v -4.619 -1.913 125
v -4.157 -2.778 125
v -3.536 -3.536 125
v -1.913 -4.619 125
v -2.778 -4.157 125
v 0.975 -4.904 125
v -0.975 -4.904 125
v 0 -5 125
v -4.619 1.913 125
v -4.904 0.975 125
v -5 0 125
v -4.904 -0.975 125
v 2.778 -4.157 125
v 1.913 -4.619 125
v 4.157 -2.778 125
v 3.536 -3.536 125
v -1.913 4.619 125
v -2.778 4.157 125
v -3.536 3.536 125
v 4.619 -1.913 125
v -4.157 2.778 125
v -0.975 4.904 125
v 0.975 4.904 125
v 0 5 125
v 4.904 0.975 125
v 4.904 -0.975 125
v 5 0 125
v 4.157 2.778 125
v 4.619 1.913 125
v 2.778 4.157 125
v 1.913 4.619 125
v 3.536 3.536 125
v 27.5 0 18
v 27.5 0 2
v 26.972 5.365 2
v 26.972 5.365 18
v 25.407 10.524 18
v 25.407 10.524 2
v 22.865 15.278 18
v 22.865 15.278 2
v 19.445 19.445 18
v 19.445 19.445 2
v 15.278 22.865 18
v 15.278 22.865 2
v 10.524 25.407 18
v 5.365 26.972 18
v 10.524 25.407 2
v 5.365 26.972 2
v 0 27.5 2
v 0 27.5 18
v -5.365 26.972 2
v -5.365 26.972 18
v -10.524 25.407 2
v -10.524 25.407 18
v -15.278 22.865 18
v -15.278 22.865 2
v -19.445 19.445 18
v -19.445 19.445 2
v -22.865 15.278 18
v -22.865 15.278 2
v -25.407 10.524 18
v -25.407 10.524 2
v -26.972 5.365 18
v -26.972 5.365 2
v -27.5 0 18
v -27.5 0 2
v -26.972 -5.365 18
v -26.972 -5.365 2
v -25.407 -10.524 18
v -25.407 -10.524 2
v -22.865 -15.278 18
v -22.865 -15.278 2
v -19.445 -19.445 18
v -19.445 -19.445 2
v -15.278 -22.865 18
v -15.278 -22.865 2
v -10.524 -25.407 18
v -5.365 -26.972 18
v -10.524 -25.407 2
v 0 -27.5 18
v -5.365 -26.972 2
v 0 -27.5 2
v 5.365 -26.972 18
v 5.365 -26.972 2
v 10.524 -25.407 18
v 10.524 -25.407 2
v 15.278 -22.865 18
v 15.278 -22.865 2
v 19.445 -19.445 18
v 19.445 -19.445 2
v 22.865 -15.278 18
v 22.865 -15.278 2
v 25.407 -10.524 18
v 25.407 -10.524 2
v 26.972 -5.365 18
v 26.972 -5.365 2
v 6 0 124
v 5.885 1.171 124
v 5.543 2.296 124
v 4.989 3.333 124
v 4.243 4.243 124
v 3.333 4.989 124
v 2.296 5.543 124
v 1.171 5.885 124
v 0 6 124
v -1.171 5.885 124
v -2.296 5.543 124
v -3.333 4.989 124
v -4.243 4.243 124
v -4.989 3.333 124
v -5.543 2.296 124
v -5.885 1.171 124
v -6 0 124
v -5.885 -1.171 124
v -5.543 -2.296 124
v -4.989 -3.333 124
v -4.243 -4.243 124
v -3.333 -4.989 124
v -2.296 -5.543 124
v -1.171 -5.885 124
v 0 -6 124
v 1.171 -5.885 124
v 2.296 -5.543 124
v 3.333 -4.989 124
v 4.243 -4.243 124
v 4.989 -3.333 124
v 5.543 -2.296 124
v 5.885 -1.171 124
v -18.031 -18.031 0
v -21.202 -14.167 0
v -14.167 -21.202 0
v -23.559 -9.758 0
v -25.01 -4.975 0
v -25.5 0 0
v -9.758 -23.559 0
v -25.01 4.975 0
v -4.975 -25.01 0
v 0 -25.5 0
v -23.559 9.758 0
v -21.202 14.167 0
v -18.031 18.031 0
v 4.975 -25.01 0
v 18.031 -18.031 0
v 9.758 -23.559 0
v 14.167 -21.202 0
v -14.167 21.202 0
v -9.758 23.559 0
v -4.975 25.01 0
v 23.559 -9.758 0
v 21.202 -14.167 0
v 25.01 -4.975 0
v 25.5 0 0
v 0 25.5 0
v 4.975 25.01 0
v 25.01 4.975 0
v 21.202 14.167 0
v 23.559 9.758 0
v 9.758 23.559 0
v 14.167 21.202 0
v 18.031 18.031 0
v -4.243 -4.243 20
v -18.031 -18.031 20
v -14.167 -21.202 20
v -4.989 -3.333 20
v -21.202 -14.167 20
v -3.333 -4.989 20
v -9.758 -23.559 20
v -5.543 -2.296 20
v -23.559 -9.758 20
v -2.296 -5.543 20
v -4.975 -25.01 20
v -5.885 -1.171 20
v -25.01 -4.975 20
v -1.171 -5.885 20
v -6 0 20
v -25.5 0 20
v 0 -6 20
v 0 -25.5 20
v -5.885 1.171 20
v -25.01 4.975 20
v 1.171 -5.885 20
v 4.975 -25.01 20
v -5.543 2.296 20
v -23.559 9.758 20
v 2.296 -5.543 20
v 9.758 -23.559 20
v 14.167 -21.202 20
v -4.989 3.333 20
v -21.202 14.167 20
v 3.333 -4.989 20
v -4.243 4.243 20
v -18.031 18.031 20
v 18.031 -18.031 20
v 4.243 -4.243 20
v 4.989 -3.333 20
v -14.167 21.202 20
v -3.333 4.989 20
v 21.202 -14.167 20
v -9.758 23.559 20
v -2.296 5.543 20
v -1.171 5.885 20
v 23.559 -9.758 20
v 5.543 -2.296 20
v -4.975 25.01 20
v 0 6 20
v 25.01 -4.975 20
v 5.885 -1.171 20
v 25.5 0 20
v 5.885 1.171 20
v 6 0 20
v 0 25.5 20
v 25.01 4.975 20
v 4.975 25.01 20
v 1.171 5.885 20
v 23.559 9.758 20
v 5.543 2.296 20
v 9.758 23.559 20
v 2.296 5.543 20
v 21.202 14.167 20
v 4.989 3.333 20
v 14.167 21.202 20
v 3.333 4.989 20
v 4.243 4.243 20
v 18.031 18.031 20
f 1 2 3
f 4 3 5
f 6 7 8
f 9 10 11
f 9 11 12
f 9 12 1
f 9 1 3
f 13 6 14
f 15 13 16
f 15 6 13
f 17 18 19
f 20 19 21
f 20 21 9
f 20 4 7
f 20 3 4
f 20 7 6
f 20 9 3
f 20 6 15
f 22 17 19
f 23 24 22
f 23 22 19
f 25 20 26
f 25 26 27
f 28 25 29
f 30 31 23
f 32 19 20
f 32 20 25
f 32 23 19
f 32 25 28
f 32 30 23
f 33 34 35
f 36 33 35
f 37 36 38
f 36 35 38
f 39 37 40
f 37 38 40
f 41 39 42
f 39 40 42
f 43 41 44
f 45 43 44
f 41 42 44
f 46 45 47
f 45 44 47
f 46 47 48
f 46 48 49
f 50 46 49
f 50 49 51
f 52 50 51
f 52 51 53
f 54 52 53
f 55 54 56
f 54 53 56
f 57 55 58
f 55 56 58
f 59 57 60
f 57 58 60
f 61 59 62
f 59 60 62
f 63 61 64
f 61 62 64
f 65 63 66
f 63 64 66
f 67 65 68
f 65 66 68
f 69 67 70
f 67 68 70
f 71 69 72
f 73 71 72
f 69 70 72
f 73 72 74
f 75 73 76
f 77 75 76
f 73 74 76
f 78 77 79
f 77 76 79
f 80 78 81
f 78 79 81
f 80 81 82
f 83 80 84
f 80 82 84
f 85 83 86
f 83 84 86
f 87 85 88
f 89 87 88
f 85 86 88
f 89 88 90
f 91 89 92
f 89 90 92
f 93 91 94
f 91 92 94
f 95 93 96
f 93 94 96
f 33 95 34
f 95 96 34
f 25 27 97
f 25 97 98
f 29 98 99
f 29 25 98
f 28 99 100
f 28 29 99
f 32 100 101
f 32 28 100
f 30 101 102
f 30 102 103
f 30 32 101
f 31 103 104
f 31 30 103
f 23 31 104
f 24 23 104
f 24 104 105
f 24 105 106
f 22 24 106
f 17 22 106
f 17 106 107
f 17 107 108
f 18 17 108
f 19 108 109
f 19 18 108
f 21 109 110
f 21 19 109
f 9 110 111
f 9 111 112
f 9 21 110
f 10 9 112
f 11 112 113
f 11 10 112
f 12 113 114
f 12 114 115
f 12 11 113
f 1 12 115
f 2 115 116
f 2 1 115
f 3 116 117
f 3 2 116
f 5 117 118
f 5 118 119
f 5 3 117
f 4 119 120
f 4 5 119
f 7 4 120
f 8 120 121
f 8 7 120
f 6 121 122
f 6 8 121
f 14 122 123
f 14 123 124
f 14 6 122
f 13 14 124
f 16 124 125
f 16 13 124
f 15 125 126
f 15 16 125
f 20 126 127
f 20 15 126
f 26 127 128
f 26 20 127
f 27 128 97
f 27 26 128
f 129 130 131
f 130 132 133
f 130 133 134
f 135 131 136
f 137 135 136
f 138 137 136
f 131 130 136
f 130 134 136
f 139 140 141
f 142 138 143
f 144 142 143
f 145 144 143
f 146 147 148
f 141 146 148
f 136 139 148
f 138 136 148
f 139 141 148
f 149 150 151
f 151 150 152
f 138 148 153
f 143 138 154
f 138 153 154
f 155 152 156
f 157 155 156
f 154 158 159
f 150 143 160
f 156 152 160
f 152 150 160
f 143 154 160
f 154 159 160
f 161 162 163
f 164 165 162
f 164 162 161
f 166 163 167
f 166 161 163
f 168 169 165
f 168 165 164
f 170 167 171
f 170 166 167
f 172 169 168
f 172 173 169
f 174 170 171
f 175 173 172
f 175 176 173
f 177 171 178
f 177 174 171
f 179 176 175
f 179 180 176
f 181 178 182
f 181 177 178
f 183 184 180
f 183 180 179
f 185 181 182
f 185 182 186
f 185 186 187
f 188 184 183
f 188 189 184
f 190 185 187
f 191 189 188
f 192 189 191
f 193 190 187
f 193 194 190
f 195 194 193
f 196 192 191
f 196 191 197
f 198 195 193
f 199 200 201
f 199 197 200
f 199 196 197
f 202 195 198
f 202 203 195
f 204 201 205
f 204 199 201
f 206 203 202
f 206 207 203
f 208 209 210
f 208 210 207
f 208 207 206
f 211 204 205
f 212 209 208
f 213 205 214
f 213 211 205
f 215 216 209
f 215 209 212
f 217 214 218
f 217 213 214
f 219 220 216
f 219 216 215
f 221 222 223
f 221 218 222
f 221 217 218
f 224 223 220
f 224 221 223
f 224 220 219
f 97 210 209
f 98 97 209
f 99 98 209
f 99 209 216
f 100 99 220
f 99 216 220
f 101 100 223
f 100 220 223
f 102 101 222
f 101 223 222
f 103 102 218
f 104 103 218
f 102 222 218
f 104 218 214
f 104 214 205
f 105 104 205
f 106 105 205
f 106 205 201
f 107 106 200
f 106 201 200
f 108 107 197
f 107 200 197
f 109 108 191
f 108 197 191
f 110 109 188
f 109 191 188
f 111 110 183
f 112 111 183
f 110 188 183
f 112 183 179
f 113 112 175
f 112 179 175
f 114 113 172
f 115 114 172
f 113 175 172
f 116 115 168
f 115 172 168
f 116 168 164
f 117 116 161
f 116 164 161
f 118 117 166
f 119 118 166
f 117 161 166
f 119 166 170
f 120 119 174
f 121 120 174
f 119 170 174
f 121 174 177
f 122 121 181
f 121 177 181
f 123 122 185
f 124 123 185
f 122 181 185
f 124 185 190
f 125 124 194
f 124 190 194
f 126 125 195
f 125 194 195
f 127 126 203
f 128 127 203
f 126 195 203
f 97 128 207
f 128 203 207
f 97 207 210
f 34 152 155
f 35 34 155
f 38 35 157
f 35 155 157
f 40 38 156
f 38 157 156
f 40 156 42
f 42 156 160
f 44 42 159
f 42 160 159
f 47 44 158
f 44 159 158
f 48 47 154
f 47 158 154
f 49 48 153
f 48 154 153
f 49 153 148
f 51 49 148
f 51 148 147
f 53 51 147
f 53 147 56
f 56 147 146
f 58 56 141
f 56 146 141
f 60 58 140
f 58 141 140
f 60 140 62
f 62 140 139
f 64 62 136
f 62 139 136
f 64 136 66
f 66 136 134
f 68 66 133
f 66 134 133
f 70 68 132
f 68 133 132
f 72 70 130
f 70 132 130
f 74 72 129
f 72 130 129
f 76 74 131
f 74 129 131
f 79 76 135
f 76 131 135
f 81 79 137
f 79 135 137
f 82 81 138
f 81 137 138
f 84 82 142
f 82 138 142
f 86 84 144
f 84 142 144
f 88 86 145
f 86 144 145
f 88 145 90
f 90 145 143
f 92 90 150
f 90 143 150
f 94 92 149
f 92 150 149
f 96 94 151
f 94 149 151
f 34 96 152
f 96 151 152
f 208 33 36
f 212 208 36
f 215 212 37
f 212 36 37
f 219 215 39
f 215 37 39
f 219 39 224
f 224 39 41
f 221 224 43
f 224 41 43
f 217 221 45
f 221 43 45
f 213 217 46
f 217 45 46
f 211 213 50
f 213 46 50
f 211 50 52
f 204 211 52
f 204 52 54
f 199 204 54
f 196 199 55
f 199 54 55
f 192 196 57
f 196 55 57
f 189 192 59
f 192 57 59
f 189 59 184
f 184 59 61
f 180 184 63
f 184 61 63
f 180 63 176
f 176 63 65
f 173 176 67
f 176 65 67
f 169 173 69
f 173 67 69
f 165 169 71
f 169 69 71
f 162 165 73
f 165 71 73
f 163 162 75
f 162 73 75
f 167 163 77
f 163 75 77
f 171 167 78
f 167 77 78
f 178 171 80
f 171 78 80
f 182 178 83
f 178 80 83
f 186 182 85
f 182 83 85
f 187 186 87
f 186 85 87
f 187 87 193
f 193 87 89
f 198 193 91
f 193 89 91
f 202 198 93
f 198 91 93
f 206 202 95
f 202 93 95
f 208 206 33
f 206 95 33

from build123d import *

# Parameters (mm, degrees)
SKETCH1_R           = 27.5
BOSS_EXTRUDE1_DEPTH = 20
SKETCH2_R           = 6
BOSS_EXTRUDE2_DEPTH = 105
CHAMFER1_SIZE       = 1
CHAMFER2_SIZE       = 2


with BuildPart() as part:
    # Sketch1 → Boss-Extrude1 (new body)
    with BuildSketch(Plane.XY):
        Circle(SKETCH1_R)
    extrude(amount=BOSS_EXTRUDE1_DEPTH)

    # Sketch2 → Boss-Extrude2 (add)
    with BuildSketch(Plane.XY.offset(20)):
        Circle(SKETCH2_R)
    extrude(amount=BOSS_EXTRUDE2_DEPTH)

    # Chamfer1
    chamfer1_edges = [part.edges().sort_by_distance(p)[0] for p in [
        (-6, 0, 125),
    ]]
    chamfer(chamfer1_edges, length=CHAMFER1_SIZE)

    # Chamfer2
    chamfer2_edges = [part.edges().sort_by_distance(p)[0] for p in [
        (-27.5, 0, 0),
        (-27.5, 0, 20),
    ]]
    chamfer(chamfer2_edges, length=CHAMFER2_SIZE)


solid = part.part
